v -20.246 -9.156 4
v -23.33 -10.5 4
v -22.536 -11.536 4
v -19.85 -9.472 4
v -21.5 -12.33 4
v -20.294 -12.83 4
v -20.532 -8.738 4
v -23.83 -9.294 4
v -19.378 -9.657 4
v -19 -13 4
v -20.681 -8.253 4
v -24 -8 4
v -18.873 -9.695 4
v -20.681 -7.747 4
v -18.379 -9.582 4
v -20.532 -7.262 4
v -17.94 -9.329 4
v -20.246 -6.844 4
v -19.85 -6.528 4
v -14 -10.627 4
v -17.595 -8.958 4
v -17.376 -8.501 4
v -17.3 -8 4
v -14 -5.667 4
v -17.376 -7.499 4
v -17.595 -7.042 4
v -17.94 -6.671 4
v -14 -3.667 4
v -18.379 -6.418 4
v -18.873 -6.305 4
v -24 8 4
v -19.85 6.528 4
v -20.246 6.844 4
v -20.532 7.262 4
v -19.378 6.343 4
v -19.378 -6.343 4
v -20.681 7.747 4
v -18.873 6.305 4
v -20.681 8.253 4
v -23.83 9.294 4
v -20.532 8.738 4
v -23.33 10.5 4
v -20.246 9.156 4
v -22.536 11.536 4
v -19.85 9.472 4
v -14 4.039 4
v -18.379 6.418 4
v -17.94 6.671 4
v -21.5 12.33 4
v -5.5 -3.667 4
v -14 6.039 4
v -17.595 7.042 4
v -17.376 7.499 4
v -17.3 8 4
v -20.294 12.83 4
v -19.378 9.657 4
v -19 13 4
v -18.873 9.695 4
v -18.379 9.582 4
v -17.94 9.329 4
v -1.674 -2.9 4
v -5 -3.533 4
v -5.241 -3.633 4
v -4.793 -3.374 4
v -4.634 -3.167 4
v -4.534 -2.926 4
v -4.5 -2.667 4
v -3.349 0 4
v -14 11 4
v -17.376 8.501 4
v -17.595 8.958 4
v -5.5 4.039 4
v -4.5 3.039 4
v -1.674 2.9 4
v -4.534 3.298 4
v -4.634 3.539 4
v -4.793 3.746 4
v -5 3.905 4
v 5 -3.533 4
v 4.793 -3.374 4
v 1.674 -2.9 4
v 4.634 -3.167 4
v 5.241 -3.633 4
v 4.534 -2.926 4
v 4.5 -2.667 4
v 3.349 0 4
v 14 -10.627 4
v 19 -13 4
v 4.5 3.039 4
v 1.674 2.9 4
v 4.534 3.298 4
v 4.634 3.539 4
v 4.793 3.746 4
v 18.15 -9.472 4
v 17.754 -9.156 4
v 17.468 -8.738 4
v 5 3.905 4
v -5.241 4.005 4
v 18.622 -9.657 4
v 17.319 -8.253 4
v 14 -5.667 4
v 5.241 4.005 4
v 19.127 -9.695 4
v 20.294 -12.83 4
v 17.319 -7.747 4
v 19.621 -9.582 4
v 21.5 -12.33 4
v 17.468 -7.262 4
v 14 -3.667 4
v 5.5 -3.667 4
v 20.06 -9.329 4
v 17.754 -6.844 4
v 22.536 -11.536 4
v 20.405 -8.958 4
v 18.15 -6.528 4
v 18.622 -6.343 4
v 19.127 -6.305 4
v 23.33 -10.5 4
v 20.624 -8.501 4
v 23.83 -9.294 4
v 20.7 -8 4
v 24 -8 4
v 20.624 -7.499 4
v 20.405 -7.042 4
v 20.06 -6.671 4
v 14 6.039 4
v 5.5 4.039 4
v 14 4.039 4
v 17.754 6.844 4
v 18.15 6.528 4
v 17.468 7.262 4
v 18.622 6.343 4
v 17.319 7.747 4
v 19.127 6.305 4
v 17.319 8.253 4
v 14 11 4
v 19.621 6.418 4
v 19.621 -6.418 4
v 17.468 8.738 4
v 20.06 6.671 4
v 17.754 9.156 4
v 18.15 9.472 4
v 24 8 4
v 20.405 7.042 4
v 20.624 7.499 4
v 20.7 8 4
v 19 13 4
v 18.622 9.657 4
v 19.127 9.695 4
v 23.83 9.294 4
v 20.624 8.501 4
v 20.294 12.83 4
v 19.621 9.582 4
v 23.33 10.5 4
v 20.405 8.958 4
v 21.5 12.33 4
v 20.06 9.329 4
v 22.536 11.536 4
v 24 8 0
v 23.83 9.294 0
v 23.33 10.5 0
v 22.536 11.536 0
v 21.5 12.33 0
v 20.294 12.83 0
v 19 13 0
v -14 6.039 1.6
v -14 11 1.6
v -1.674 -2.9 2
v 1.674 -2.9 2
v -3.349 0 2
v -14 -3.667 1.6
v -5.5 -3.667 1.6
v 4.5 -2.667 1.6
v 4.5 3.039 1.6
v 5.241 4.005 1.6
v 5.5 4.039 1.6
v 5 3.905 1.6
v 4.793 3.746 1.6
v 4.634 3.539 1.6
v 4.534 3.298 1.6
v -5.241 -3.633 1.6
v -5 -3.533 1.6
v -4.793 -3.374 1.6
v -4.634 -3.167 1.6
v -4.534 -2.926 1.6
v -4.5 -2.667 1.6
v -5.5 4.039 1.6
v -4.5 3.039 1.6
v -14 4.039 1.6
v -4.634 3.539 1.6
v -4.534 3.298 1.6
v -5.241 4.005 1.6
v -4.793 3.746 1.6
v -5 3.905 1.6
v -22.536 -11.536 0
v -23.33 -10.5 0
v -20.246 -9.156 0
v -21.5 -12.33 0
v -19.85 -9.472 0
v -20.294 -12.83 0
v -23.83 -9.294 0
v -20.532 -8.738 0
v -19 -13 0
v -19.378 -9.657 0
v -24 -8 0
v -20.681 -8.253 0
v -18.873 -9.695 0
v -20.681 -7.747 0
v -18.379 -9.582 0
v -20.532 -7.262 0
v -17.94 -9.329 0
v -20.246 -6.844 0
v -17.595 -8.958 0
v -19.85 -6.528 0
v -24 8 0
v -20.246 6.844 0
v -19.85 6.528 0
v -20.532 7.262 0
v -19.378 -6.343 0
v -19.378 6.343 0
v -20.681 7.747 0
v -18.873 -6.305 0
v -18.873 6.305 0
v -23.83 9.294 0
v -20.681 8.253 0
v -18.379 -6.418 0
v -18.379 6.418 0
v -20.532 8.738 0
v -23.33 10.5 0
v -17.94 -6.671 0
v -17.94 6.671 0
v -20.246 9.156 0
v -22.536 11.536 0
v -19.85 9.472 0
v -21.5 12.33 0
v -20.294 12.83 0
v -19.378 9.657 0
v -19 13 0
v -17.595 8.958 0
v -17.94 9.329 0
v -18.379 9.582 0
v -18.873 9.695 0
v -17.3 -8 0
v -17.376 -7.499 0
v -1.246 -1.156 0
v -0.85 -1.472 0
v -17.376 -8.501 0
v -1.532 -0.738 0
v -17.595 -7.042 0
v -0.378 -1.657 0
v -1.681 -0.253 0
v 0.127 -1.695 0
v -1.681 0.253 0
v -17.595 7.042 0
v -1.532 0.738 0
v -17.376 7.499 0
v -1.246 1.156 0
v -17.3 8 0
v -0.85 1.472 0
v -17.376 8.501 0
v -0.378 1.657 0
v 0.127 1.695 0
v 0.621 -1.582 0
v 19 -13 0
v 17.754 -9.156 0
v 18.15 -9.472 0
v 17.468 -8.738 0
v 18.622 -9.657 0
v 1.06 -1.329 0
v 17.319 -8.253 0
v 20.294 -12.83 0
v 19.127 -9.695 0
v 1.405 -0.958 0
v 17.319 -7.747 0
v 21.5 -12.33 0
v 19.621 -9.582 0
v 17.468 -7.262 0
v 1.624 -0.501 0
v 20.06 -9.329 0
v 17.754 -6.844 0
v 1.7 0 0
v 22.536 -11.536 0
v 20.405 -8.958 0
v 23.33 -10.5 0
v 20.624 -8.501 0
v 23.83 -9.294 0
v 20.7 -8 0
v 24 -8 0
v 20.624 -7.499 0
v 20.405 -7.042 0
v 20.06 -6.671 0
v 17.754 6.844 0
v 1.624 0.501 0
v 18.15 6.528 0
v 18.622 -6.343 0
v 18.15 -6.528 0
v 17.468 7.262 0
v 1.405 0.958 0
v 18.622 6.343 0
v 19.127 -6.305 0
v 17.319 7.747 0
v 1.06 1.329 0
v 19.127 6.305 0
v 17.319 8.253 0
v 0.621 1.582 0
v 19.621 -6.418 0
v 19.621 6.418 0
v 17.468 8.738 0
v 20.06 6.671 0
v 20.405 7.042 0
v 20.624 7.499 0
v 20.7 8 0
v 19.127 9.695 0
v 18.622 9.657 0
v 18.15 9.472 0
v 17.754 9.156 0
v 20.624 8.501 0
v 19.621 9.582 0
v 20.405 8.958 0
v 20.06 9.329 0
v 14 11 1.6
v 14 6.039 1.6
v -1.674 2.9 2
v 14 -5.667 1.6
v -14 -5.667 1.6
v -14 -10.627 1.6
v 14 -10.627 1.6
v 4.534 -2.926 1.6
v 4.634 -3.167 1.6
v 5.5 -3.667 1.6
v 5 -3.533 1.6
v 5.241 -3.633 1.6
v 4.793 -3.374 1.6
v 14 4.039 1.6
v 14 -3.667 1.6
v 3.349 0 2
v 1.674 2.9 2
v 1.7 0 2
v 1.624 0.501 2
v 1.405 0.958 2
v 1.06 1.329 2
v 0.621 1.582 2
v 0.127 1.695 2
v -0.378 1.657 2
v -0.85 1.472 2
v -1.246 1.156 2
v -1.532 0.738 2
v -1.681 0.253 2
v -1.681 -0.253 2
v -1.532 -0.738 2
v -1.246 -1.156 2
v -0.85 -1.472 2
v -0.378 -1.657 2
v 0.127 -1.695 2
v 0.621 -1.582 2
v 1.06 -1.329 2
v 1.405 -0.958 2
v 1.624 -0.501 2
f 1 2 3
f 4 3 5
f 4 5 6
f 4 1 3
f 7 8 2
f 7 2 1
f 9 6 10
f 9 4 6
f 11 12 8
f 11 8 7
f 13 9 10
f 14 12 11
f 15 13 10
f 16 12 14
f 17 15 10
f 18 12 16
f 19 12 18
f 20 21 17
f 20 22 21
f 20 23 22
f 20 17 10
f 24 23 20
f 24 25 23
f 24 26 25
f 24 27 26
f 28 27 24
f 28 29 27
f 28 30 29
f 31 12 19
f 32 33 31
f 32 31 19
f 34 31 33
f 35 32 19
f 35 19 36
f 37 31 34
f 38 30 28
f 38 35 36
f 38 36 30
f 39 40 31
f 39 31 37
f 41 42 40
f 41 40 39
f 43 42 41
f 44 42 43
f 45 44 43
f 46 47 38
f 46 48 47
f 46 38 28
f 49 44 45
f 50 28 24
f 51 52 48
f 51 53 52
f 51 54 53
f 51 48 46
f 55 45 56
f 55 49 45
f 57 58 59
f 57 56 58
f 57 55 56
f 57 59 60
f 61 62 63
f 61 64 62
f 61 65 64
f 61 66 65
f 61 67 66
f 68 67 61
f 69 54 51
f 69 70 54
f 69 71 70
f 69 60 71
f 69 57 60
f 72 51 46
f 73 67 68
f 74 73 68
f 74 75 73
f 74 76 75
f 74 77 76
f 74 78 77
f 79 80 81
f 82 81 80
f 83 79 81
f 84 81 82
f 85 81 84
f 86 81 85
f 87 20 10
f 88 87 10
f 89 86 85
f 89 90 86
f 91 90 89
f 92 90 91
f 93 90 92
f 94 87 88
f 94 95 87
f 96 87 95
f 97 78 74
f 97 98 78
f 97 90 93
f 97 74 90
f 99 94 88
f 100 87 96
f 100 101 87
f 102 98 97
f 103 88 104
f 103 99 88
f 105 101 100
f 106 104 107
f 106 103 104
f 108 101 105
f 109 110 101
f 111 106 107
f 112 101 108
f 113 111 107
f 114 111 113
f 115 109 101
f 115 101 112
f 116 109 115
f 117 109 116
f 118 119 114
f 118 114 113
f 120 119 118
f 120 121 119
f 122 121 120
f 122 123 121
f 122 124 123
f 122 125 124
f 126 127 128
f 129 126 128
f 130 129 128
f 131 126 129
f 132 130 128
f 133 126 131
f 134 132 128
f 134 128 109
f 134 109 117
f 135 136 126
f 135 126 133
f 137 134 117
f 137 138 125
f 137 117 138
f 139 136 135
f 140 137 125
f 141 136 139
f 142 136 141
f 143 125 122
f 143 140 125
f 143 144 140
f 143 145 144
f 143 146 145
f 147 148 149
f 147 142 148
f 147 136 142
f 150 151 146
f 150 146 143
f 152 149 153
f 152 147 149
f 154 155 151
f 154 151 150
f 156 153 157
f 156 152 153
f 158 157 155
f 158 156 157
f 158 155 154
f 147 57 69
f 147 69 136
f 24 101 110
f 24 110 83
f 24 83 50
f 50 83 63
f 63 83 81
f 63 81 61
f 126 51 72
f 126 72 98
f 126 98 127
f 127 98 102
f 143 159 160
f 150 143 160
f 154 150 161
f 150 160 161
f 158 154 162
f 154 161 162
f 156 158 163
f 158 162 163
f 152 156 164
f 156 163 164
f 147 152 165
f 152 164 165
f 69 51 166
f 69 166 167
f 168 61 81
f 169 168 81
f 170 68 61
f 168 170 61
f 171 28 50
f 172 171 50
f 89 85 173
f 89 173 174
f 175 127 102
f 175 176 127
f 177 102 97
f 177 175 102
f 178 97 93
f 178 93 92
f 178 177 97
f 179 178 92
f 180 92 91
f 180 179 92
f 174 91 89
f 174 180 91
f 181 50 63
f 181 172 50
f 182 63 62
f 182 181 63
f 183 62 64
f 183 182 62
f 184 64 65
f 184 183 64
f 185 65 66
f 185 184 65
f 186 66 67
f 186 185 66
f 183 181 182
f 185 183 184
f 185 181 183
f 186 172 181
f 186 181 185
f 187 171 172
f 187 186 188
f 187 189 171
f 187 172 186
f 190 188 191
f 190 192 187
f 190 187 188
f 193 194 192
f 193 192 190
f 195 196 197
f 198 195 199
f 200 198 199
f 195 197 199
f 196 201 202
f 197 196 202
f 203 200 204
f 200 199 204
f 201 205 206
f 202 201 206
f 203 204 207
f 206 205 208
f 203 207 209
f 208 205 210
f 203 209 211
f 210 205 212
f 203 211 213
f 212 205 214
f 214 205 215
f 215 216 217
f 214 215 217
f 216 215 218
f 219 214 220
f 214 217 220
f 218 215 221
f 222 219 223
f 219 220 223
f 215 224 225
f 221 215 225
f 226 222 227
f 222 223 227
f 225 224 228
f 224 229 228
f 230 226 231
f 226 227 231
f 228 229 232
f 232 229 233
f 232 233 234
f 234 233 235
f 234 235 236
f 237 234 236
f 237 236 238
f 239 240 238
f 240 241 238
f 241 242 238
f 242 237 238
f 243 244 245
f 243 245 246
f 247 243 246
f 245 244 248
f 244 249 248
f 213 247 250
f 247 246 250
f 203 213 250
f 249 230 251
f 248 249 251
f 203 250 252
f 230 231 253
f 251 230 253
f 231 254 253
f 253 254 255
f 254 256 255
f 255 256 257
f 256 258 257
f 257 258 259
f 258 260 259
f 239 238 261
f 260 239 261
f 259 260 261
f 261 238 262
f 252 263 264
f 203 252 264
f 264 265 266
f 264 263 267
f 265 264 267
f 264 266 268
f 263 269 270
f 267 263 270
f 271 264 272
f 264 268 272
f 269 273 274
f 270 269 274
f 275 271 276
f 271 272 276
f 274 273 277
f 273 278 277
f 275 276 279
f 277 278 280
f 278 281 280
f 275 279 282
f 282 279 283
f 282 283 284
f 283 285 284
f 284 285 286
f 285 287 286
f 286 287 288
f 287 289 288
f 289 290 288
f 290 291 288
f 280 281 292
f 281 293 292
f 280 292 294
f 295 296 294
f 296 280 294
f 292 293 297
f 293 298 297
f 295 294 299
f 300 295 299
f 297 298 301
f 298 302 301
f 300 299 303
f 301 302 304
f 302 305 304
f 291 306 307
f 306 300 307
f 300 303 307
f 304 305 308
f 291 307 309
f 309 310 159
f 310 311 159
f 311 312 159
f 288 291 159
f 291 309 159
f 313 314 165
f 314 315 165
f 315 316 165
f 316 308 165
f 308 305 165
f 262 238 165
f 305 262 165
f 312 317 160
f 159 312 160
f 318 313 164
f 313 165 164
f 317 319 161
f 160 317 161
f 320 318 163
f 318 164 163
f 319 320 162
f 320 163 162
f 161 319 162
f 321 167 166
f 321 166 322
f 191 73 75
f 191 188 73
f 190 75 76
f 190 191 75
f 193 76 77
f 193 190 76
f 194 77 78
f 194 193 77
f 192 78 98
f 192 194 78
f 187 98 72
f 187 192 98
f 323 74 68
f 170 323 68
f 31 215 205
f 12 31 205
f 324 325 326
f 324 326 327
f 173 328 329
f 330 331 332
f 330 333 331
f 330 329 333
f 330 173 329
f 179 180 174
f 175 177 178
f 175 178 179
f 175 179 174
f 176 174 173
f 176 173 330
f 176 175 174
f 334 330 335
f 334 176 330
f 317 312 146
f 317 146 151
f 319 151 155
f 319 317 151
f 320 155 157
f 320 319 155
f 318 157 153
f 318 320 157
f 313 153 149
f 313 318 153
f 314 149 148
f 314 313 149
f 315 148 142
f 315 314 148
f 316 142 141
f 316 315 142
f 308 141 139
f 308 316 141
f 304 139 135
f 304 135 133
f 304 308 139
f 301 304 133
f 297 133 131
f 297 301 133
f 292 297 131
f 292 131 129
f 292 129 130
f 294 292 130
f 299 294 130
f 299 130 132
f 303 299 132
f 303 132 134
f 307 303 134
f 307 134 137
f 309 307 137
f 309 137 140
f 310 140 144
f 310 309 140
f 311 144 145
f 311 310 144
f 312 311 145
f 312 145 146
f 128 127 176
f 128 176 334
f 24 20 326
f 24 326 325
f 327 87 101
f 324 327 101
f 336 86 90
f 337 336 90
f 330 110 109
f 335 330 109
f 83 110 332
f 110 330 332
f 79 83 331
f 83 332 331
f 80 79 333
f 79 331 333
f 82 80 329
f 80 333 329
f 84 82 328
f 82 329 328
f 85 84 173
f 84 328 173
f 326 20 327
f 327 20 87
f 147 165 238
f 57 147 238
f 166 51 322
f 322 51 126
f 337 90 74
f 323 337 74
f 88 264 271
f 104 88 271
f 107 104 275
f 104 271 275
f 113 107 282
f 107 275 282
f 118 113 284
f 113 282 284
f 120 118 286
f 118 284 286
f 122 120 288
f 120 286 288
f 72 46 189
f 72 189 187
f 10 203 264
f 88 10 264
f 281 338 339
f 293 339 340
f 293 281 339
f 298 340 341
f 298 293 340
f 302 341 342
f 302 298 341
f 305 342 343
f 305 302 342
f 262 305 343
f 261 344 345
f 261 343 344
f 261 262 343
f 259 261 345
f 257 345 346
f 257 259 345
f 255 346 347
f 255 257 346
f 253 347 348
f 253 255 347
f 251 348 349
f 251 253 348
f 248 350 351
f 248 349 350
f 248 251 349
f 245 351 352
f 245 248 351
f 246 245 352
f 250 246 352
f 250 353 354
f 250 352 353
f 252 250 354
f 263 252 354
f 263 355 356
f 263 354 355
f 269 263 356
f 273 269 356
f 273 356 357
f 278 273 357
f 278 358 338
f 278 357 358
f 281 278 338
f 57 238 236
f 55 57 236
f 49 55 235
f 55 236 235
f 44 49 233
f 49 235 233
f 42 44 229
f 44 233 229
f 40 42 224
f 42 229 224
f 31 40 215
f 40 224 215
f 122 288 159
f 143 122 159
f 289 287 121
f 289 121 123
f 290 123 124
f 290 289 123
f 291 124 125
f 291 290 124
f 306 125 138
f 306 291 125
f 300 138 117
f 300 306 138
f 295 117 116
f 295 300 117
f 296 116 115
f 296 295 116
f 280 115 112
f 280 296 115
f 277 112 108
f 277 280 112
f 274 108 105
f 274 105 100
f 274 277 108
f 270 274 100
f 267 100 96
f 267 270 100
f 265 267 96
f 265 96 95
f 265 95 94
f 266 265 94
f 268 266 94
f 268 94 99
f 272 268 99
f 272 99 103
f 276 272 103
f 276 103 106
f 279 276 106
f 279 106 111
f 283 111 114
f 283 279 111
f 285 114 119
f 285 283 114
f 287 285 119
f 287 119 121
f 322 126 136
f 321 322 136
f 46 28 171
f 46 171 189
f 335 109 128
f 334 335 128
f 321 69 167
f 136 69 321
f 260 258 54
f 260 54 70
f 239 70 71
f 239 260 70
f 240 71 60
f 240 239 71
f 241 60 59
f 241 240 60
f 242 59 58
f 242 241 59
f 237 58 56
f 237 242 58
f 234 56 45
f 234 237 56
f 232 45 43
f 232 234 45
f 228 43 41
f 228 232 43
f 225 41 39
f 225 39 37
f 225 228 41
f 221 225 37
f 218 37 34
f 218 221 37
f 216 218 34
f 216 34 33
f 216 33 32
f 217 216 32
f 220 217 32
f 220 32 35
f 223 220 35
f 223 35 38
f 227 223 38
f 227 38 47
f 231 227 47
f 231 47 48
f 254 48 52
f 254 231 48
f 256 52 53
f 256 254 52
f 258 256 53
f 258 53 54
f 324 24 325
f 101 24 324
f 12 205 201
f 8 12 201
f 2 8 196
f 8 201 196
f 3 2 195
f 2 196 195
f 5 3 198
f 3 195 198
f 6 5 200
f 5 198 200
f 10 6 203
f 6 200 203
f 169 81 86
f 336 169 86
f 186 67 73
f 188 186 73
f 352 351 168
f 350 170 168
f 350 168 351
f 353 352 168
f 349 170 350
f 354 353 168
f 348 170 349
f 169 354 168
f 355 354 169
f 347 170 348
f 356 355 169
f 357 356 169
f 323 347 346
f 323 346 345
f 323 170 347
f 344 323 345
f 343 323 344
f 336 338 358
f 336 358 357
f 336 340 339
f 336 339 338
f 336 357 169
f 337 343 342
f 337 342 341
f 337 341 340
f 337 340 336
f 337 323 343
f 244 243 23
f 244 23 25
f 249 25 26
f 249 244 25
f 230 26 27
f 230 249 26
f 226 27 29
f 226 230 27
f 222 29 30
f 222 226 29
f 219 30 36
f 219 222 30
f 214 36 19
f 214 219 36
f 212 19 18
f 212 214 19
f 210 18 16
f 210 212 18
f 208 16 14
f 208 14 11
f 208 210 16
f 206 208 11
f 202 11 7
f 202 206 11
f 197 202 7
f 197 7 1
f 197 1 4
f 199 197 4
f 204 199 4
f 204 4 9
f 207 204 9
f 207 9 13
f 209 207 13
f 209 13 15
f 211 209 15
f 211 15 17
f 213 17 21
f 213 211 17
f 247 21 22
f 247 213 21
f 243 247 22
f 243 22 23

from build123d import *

# Parameters (mm, degrees)
SKETCH1_R           = 1.7
BOSS_EXTRUDE1_DEPTH = 4
CUT_EXTRUDE1_DEPTH  = 2
SKETCH3_W           = 28
SKETCH3_H           = 4.960661027
SKETCH3_W_2         = 9.5
SKETCH3_H_2         = 7.70604726
SKETCH3_H_3         = 4.960661028
CUT_EXTRUDE2_DEPTH  = 2.4
FILLET1_R           = 1


with BuildPart() as part:
    # Sketch1 → Boss-Extrude1 (new body)
    with BuildSketch(Plane.XY):
        with BuildLine():
            Line((-19, -13), (19, -13))
            ThreePointArc((19, -13), (22.535533906, -11.535533906), (24, -8))
            Line((24, -8), (24, 8))
            ThreePointArc((24, 8), (22.535533906, 11.535533906), (19, 13))
            Line((19, 13), (-19, 13))
            ThreePointArc((-19, 13), (-22.535533906, 11.535533906), (-24, 8))
            Line((-24, 8), (-24, -8))
            ThreePointArc((-24, -8), (-22.535533906, -11.535533906), (-19, -13))
        make_face()
        Circle(SKETCH1_R, mode=Mode.SUBTRACT)
        with Locations((19, 8)):
            Circle(SKETCH1_R, mode=Mode.SUBTRACT)
        with Locations((19, -8)):
            Circle(SKETCH1_R, mode=Mode.SUBTRACT)
        with Locations((-19, -8)):
            Circle(SKETCH1_R, mode=Mode.SUBTRACT)
        with Locations((-19, 8)):
            Circle(SKETCH1_R, mode=Mode.SUBTRACT)
    extrude(amount=BOSS_EXTRUDE1_DEPTH)

    # Sketch2 → Cut-Extrude1 (cut)
    with BuildSketch(Plane.XY.offset(4)):
        Polygon((3.348631561, 0), (1.674315781, 2.9), (-1.674315781, 2.9), (-3.348631561, 0), (-1.674315781, -2.9), (1.674315781, -2.9), align=None)
    extrude(amount=-CUT_EXTRUDE1_DEPTH, mode=Mode.SUBTRACT)

    # Sketch3 → Cut-Extrude2 (cut)
    with BuildSketch(Plane.XY.offset(4)):
        with Locations((0, 8.519669486)):
            Rectangle(SKETCH3_W, SKETCH3_H)
        with Locations((-9.25, 0.186315343)):
            Rectangle(SKETCH3_W_2, SKETCH3_H_2)
        with Locations((9.25, 0.186315343)):
            Rectangle(SKETCH3_W_2, SKETCH3_H_2)
        with Locations((0, -8.147038801)):
            Rectangle(SKETCH3_W, SKETCH3_H_3)
    extrude(amount=-CUT_EXTRUDE2_DEPTH, mode=Mode.SUBTRACT)

    # Fillet1
    fillet1_edges = [part.edges().sort_by_distance(p)[0] for p in [
        (-4.5, 4.039338973, 2.8),
        (-4.5, -3.666708287, 2.8),
        (4.5, -3.666708287, 2.8),
        (4.5, 4.039338973, 2.8),
    ]]
    fillet(fillet1_edges, radius=FILLET1_R)


solid = part.part
